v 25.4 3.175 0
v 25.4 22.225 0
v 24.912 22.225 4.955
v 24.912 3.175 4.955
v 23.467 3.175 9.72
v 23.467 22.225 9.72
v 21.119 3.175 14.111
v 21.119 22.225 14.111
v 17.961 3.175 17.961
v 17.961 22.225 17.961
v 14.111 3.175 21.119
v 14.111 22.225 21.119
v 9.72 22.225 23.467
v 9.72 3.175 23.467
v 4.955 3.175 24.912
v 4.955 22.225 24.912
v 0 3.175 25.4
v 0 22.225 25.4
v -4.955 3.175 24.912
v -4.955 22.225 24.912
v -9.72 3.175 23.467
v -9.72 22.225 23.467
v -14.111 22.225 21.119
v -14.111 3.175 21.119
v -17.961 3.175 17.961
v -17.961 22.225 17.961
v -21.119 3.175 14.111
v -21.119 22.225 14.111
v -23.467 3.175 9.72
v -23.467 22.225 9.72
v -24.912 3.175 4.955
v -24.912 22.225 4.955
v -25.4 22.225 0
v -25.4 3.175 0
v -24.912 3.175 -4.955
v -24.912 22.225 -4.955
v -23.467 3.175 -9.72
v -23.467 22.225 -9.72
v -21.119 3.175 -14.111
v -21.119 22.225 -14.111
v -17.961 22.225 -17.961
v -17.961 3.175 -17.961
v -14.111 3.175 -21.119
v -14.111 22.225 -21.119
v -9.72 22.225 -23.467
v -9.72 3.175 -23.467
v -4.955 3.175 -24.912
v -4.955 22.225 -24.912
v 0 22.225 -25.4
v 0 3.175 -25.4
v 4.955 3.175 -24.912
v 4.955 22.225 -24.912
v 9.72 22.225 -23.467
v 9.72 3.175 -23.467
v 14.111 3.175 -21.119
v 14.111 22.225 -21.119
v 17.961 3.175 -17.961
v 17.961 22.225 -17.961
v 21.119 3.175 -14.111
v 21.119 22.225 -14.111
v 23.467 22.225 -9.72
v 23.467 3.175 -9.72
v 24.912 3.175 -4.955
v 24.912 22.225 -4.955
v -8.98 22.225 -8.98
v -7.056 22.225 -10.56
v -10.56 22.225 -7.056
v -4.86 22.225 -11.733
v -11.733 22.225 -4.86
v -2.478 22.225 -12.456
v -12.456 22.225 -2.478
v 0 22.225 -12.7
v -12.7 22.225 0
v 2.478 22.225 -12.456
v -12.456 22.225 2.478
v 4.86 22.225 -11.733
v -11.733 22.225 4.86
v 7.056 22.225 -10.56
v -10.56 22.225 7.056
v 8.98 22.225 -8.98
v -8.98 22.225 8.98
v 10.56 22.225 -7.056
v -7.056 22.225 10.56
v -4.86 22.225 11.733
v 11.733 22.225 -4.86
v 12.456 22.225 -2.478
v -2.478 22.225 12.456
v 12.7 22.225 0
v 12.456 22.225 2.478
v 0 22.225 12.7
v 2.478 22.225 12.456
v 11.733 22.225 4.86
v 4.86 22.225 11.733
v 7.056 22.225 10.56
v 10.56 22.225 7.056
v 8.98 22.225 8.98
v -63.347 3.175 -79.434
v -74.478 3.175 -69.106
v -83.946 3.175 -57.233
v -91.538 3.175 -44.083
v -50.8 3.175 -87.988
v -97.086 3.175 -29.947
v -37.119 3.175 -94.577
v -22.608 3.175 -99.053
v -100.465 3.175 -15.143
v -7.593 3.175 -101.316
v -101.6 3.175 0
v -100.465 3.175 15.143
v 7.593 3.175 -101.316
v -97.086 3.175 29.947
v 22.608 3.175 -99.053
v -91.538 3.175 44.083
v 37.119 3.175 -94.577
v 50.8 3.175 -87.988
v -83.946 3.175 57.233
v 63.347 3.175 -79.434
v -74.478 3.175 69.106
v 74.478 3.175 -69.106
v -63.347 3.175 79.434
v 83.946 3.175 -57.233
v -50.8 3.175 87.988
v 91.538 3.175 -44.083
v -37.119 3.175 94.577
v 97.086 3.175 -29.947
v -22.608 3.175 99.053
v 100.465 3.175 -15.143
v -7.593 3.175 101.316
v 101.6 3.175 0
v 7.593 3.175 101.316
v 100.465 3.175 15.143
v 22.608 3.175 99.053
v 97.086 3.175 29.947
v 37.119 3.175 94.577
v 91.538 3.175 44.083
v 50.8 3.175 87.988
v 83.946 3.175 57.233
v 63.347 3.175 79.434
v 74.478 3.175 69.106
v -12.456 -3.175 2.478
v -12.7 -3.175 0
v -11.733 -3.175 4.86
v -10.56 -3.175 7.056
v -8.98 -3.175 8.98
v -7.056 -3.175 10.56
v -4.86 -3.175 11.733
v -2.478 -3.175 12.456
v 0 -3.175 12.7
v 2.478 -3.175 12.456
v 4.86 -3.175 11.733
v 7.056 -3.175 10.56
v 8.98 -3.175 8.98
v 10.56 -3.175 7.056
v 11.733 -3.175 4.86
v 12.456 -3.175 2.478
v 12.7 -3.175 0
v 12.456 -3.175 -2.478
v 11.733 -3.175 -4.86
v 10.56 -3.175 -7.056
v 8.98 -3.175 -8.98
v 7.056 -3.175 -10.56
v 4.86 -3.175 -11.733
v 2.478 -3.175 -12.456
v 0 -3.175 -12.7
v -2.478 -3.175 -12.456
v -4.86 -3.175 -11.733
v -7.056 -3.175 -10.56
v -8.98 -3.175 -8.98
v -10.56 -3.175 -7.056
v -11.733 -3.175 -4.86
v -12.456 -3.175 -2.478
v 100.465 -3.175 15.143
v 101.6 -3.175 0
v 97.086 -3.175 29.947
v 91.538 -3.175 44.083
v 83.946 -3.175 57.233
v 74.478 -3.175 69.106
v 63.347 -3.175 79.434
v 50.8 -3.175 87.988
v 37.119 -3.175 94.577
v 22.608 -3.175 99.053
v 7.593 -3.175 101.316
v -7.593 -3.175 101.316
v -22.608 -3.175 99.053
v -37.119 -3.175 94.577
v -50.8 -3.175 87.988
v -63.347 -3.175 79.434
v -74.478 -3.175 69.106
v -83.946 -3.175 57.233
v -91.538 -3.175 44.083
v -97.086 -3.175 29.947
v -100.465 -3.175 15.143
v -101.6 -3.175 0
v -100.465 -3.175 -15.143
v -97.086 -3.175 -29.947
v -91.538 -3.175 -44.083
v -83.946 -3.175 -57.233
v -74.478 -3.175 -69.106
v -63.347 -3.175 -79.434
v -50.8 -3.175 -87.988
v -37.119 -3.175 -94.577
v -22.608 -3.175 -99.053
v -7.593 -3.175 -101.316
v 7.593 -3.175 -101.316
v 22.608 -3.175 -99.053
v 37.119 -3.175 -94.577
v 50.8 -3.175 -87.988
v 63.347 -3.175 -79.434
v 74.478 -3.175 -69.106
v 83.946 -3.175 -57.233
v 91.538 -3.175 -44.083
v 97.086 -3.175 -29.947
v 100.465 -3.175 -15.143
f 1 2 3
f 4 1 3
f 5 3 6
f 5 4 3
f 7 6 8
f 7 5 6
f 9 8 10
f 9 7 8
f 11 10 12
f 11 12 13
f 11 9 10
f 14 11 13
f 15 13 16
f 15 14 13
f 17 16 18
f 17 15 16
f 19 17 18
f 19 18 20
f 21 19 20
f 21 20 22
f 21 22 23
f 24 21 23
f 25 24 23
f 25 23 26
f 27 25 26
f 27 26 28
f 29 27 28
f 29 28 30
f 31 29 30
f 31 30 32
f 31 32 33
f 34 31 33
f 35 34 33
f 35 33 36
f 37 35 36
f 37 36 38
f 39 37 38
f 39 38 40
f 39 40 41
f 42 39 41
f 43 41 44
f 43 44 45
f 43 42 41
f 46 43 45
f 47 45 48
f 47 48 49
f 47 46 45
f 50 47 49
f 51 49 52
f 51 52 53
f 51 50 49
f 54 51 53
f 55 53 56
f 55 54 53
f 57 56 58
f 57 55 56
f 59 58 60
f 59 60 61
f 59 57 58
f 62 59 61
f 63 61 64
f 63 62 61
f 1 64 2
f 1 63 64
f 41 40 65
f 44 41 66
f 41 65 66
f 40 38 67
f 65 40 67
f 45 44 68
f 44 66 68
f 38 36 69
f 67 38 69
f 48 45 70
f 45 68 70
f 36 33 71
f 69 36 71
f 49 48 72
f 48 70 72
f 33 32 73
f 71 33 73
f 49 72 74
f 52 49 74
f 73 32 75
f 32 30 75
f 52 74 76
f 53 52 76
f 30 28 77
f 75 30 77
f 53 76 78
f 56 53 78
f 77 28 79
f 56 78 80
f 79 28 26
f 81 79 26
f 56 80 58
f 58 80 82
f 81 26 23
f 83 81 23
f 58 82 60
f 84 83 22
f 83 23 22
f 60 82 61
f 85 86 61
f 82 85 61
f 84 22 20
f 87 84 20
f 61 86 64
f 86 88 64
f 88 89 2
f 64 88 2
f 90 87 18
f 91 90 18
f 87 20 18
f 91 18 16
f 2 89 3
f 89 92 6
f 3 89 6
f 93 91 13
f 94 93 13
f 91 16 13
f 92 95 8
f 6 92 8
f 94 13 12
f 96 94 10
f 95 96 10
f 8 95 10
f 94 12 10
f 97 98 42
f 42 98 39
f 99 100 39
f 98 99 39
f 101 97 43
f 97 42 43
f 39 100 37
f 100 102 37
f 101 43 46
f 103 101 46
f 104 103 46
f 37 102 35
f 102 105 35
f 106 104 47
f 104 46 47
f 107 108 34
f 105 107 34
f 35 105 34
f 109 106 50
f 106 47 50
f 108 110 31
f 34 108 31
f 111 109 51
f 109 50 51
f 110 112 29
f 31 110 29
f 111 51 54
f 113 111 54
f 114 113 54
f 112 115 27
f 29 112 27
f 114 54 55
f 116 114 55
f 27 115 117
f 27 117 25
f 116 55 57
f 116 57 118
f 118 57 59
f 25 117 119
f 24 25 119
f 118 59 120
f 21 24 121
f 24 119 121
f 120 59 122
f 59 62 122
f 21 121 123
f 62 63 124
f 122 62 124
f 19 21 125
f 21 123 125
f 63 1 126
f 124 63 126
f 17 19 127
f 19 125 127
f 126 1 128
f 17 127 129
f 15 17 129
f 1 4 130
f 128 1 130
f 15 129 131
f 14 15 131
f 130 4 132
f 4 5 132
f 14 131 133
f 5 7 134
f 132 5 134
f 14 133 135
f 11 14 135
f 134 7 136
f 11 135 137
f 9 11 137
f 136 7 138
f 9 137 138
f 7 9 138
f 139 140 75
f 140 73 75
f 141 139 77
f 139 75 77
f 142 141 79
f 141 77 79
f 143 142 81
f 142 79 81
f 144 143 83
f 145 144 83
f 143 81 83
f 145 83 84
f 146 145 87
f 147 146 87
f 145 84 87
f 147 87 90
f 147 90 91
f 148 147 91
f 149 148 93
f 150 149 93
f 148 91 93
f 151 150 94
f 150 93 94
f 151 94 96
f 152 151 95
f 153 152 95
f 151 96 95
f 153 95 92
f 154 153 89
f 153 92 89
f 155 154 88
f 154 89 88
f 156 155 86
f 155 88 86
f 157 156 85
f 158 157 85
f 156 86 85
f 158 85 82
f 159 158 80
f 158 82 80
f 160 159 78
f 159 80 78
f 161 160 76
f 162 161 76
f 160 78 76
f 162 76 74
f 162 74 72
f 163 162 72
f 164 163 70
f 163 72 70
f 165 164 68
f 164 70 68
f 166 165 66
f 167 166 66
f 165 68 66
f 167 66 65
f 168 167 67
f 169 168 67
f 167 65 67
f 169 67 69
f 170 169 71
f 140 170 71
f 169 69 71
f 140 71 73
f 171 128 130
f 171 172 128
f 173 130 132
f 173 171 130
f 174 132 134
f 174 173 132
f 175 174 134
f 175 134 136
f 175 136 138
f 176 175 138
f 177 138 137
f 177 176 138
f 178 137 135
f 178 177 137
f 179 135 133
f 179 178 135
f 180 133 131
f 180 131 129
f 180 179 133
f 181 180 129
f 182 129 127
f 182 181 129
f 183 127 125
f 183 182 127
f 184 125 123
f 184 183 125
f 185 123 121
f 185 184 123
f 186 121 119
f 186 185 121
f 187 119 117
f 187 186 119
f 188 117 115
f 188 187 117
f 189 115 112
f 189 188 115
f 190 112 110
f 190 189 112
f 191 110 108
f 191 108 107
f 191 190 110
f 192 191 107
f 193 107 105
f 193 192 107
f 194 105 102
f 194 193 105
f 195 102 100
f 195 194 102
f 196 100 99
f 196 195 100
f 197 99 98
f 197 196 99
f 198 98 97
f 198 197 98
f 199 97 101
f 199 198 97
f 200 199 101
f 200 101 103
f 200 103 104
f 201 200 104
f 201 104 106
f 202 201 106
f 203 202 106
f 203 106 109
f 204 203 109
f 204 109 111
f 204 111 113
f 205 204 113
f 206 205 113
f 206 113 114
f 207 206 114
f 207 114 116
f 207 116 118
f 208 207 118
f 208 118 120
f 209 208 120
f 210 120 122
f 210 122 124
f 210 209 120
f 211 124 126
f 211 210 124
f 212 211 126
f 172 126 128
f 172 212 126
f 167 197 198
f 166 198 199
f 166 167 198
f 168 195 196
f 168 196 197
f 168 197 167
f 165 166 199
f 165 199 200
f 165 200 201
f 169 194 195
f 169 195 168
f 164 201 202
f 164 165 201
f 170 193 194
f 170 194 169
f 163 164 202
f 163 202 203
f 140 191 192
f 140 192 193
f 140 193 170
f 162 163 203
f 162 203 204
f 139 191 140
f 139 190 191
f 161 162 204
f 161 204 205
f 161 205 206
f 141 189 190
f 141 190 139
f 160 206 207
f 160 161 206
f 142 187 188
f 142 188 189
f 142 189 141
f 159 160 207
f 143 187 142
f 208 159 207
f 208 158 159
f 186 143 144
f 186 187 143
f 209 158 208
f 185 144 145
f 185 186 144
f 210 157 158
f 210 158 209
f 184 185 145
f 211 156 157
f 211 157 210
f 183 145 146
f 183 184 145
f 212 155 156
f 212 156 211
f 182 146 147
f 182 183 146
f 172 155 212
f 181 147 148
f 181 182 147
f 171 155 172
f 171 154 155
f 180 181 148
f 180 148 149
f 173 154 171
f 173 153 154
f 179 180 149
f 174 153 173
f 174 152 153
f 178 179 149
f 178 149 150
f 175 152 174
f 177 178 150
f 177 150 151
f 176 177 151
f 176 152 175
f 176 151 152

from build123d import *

# Parameters (mm, degrees)
F0_R     = 101.6
F1_DEPTH = 3.175
F2_R     = 25.4
F3_DEPTH = 25.4
F4_R     = 12.7
F5_DEPTH = 63.5


with BuildPart() as f1:
    # F0 (on Front) → F1 (new body, symmetric)
    with BuildSketch(Plane.XZ):
        Circle(F0_R)
    extrude(amount=F1_DEPTH, both=True)

    # F2 (on face) → F3 (join)
    with BuildSketch(Plane.XZ.offset(3.175)):
        Circle(F2_R)
    extrude(amount=-F3_DEPTH)

    # F4 (on face) → F5 (cut, symmetric)
    with BuildSketch(Plane(origin=(0, 3.175, 0), x_dir=(-1, 0, 0), z_dir=(0, 1, 0))):
        Circle(F4_R)
    extrude(amount=F5_DEPTH, both=True, mode=Mode.SUBTRACT)


solid = f1.part
